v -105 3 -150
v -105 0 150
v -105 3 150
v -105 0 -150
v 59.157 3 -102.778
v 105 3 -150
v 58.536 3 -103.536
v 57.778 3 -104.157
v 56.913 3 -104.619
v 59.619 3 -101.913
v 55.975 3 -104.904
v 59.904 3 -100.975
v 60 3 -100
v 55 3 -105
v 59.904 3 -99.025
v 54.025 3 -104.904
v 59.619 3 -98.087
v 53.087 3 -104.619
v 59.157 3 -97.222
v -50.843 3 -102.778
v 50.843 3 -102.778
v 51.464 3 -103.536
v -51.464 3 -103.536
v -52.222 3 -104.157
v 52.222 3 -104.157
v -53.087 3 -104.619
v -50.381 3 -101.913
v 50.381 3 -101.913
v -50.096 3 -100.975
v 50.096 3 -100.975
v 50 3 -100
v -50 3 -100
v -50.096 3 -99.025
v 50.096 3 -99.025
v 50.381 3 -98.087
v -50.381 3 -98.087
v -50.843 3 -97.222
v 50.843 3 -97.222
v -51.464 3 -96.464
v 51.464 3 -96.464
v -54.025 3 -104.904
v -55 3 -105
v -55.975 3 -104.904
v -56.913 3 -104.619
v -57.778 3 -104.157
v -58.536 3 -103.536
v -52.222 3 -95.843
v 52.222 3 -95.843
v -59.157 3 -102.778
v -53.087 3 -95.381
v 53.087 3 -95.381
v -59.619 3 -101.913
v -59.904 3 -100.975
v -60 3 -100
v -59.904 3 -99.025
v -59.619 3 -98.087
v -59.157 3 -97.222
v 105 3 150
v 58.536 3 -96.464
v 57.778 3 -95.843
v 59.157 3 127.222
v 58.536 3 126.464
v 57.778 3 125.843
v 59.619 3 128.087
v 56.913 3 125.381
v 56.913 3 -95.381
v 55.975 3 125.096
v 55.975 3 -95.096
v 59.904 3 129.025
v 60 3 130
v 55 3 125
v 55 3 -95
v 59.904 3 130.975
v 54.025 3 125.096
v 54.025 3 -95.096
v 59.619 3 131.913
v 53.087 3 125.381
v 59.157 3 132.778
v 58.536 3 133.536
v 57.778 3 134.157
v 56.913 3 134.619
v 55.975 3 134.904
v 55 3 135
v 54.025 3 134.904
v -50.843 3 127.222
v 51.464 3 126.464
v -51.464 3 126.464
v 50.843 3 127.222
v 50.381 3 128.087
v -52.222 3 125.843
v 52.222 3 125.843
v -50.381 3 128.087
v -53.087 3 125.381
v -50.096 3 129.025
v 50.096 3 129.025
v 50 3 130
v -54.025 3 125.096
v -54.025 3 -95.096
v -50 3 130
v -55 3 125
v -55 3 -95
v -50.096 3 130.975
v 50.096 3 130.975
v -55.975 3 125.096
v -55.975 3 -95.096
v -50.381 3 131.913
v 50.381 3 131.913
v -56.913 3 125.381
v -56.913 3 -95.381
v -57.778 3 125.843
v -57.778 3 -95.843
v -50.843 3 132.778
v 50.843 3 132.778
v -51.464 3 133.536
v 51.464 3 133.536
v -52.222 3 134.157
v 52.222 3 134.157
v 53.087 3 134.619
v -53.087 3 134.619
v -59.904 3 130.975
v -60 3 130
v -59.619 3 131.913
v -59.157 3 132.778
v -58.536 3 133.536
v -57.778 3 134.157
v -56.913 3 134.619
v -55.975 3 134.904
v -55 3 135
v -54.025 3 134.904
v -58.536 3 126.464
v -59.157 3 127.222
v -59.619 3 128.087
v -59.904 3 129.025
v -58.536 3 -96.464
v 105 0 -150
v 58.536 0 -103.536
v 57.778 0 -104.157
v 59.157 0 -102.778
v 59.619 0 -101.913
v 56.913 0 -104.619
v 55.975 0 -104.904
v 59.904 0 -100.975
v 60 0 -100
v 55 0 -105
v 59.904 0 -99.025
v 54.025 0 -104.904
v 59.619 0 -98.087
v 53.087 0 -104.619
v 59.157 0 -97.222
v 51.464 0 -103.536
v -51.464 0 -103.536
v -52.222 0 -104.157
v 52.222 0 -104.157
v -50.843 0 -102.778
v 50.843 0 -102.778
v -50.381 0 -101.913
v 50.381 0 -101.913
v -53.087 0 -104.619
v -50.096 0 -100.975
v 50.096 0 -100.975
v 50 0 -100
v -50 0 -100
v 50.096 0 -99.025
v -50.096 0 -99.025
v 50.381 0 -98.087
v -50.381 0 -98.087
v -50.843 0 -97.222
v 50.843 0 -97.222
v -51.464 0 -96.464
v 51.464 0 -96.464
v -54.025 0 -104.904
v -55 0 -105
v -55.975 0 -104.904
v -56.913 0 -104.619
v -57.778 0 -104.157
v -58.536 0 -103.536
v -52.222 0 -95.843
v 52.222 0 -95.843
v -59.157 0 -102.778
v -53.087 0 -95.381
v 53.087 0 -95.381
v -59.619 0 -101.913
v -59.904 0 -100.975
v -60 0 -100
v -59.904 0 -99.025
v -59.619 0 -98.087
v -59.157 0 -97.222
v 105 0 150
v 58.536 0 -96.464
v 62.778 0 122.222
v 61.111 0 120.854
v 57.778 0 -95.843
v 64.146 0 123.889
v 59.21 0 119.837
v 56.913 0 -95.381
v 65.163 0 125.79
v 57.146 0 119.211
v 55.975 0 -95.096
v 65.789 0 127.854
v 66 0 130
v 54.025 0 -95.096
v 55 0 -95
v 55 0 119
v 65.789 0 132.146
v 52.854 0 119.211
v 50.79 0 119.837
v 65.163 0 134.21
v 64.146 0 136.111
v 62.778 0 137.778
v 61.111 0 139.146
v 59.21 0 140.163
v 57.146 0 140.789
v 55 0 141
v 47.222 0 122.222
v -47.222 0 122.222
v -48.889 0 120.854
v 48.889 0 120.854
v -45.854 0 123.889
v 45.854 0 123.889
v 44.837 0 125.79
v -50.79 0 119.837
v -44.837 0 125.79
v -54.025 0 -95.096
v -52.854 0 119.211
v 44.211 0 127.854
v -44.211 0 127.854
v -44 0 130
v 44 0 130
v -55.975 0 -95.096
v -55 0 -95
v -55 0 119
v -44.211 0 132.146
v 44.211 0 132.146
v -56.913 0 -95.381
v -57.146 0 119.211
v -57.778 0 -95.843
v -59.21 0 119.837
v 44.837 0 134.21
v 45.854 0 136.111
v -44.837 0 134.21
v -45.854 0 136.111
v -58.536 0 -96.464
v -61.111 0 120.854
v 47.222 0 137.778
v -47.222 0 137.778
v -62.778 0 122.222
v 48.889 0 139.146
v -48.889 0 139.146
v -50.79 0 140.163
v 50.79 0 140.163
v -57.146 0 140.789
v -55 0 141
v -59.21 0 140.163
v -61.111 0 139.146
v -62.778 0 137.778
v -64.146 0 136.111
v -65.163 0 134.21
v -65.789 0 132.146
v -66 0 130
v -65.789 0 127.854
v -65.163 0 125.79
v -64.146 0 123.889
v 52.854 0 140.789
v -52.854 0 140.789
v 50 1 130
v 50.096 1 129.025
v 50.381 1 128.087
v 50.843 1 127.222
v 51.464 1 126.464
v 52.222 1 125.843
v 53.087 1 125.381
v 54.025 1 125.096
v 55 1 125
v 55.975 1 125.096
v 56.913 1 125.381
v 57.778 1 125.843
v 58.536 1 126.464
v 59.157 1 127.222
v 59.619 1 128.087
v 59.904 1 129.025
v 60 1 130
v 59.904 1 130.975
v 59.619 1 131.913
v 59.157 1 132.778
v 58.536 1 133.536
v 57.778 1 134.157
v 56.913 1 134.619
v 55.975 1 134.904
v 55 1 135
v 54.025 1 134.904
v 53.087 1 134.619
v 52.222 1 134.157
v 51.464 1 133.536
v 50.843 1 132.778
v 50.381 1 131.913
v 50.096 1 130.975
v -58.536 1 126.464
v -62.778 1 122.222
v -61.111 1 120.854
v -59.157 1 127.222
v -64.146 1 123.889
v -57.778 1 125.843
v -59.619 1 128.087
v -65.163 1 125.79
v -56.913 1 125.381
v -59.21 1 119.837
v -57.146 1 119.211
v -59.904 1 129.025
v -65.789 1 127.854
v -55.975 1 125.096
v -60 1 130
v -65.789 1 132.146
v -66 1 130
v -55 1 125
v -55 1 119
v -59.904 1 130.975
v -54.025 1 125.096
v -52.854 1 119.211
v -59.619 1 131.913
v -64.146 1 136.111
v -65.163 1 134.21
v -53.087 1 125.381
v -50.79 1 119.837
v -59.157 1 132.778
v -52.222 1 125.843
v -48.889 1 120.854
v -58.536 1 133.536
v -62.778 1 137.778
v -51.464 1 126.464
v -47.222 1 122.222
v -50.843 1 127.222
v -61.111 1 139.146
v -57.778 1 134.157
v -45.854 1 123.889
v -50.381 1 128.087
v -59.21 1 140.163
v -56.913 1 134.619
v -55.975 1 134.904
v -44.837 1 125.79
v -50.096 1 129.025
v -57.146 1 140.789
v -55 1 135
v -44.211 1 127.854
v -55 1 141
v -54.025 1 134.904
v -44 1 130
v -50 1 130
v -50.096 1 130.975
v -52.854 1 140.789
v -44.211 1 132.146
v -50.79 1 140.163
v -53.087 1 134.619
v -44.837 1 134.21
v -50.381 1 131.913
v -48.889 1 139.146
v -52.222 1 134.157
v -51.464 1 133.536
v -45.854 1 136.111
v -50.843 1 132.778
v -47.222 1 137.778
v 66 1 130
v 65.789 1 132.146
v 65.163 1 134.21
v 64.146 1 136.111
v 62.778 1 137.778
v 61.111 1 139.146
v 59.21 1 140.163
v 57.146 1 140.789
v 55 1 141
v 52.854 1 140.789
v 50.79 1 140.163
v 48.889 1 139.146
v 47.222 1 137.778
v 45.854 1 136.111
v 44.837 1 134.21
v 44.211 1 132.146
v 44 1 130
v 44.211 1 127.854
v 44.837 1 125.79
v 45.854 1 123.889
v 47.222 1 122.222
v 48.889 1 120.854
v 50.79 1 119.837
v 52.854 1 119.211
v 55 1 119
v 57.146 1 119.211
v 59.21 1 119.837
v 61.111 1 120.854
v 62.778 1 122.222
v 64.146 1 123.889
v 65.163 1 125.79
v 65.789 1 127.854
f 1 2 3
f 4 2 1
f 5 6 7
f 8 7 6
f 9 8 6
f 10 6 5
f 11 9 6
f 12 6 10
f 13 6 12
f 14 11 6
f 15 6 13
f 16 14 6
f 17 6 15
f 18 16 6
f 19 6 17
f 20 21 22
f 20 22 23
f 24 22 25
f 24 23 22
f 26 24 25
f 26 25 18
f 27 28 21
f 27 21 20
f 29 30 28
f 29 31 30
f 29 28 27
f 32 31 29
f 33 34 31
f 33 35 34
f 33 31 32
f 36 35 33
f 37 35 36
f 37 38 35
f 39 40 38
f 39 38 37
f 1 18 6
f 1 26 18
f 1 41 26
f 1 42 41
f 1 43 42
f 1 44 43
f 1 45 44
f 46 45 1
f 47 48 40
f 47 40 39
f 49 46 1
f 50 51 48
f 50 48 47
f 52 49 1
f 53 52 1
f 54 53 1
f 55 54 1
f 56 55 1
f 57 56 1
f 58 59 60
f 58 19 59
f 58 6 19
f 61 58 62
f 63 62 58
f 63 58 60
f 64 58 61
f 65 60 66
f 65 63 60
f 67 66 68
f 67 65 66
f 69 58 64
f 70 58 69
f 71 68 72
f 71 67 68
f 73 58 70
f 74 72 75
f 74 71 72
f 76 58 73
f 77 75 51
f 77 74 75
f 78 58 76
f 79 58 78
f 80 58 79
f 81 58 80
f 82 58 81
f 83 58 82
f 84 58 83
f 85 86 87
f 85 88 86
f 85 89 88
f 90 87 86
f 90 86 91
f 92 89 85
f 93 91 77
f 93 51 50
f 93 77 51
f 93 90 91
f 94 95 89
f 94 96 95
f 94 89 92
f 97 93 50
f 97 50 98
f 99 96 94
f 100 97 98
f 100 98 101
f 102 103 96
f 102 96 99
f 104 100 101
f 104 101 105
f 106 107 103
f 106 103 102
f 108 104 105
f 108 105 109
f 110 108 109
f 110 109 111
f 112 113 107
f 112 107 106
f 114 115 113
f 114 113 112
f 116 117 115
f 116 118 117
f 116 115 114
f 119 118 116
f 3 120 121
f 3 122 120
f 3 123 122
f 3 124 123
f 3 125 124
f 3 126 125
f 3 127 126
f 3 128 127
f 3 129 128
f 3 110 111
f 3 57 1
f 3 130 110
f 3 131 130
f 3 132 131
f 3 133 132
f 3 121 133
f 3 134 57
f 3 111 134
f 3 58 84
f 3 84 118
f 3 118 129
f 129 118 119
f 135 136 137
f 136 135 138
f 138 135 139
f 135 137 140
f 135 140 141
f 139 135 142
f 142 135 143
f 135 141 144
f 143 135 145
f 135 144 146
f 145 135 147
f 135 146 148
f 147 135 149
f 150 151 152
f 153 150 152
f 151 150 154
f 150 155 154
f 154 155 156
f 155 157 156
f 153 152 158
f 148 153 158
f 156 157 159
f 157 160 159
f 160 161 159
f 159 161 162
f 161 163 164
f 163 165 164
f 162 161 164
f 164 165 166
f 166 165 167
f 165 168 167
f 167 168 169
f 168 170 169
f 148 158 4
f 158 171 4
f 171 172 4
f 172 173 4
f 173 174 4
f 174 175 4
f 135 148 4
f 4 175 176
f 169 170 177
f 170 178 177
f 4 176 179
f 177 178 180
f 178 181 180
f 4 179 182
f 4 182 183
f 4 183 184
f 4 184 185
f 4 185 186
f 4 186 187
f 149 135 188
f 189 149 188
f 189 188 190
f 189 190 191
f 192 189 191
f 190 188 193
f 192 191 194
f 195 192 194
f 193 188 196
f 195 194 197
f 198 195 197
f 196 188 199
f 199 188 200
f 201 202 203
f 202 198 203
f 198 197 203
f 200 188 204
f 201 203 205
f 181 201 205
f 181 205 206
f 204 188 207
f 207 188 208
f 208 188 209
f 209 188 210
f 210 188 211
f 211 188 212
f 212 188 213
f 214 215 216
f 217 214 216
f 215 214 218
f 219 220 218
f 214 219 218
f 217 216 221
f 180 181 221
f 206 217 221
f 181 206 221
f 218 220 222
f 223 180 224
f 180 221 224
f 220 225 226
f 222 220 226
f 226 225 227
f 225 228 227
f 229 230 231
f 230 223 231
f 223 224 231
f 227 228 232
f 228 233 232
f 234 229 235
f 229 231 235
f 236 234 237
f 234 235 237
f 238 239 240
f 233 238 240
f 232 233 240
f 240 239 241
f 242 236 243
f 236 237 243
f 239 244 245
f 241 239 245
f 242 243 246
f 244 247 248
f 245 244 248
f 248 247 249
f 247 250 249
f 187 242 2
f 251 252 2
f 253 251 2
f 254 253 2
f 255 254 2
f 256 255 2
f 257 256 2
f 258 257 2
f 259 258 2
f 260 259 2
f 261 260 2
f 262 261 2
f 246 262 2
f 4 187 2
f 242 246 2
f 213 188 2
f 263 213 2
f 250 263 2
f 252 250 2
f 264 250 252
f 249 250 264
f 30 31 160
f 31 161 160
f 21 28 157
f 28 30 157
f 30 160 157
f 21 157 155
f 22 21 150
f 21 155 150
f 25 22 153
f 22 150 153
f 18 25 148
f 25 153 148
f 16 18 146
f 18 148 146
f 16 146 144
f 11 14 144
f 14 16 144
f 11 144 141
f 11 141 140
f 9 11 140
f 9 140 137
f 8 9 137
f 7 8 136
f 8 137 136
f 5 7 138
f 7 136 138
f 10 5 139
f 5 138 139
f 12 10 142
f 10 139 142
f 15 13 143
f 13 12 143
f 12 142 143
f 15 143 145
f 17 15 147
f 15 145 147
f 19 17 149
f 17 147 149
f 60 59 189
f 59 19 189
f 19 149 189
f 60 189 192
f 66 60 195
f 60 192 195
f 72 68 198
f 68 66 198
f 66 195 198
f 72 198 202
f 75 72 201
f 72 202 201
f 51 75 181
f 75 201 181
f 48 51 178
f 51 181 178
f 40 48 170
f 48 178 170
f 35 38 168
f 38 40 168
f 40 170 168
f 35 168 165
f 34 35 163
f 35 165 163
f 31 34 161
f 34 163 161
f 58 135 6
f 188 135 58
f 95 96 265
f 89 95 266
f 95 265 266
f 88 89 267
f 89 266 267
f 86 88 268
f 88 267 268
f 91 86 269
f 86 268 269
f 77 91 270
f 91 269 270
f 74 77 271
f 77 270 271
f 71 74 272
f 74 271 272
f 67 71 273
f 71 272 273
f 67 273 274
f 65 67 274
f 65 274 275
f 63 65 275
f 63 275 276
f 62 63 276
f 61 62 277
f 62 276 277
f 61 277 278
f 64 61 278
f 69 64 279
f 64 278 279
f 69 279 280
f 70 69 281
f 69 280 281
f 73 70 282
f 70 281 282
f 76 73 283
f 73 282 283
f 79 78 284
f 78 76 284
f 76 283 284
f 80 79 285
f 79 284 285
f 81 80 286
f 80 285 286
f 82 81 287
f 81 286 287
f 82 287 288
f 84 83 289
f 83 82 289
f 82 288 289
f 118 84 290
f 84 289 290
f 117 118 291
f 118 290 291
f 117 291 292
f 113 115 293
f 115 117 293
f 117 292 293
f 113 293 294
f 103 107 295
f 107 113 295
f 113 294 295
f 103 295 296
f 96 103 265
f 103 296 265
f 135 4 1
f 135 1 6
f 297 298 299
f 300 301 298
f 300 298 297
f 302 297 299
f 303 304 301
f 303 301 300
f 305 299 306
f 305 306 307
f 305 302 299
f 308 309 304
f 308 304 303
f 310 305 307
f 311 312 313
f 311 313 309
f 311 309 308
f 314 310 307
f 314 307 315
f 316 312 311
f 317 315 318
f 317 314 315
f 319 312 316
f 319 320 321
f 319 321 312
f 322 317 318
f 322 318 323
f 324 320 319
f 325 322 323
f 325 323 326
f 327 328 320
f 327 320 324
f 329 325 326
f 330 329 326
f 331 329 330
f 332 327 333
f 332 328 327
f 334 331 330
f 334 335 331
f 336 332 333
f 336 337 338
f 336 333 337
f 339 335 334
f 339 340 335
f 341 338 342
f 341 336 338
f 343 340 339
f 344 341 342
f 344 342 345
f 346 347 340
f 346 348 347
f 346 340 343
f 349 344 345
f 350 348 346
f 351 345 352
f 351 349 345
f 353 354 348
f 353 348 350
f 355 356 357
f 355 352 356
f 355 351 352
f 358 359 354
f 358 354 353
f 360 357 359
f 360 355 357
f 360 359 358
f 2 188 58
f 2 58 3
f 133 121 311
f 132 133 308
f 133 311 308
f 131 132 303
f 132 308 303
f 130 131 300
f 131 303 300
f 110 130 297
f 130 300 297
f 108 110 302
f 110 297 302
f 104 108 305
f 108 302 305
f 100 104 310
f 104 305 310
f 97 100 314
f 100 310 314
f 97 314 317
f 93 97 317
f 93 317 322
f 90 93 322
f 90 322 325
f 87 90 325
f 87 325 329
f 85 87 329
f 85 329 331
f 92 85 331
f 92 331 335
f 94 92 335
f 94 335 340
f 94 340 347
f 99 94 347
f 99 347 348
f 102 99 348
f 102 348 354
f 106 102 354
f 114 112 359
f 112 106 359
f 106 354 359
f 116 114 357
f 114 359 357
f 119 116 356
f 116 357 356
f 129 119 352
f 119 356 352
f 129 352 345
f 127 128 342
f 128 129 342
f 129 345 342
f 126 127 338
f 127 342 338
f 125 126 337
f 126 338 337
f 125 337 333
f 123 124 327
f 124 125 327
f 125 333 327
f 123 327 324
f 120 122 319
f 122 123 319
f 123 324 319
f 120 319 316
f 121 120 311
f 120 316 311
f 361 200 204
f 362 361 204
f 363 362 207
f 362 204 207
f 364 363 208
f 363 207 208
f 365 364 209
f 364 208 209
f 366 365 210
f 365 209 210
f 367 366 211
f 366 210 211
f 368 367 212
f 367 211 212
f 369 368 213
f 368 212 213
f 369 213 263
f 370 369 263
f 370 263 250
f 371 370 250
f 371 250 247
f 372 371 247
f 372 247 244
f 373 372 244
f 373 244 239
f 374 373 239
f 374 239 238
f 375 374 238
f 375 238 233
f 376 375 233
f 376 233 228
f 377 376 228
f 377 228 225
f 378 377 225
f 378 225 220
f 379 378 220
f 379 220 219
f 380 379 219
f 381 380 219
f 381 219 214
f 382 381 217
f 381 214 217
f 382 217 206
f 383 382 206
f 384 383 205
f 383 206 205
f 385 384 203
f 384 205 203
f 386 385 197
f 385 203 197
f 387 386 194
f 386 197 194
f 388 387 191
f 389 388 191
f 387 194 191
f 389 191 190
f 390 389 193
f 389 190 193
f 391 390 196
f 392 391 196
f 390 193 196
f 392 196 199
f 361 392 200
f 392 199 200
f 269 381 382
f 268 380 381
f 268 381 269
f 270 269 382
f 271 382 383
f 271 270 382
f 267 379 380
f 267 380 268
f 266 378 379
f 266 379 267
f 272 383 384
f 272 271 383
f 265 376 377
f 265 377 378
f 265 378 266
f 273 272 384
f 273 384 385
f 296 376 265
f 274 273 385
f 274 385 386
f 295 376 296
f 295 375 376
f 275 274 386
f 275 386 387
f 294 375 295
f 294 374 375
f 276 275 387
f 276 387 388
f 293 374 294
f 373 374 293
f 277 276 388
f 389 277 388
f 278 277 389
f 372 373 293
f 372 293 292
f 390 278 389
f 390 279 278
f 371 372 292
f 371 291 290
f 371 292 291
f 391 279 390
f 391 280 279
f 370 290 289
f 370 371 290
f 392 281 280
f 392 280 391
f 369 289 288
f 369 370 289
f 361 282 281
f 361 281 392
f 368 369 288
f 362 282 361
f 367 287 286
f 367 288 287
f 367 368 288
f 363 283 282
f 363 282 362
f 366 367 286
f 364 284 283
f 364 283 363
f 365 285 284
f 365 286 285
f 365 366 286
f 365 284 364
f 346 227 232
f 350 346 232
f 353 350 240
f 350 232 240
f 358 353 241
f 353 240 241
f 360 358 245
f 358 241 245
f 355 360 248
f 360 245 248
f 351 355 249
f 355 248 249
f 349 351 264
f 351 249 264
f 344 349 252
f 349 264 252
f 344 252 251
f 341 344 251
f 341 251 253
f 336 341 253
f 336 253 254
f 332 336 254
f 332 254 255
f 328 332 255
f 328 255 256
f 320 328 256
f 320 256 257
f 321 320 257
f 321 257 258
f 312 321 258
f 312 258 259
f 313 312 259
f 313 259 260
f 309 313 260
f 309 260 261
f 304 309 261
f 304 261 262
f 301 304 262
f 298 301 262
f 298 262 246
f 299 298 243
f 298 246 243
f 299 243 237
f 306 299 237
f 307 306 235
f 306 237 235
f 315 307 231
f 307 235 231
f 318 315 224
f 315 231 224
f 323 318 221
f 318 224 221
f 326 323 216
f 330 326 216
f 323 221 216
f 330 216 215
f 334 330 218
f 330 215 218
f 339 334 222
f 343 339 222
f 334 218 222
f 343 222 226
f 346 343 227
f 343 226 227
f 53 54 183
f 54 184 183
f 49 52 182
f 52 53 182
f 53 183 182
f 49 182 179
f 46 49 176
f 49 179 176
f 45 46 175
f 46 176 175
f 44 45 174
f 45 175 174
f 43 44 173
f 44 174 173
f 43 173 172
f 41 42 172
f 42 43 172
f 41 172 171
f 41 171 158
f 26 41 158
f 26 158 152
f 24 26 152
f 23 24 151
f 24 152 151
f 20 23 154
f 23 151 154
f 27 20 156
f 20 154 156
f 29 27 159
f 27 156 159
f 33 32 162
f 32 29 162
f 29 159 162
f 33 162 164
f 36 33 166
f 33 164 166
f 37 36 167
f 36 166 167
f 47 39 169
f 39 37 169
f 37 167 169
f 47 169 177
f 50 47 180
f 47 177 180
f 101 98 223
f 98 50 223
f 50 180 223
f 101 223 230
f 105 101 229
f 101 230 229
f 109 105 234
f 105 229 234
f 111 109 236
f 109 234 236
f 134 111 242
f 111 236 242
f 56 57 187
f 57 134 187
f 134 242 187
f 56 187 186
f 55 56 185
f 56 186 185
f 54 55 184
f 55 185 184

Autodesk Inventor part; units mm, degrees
ref_plane "YZ Plane" through (0, 0, 0) normal (1, 0, 0) x (0, 1, 0)
ref_plane "XZ Plane" through (0, 0, 0) normal (0, 1, 0) x (-1, 0, 0)
ref_plane "XY Plane" through (0, 0, 0) normal (0, 0, 1) x (1, 0, 0)
sketch "Sketch1" plane through (0, 0, 0) normal (0, 1, 0) x (-1, 0, 0)
  line L0 (-105, 150) -> (105, 150)
  line L1 (105, 150) -> (105, -150)
  line L2 (105, -150) -> (-105, -150)
  line L3 (-105, -150) -> (-105, 150)
  line L4 (-105, 150) -> (105, -150) construction
  line L5 (105, 150) -> (-105, -150) construction
  circle A0 centre (-55, 130) radius 5
  circle A1 centre (55, 130) radius 5
  circle A2 centre (55, -100) radius 5
  circle A3 centre (-55, -100) radius 5
  point P0 (0, 0)
  dimension "d0" = 210
  dimension "d1" = 300
  dimension "d2" = 50
  dimension "d3" = 10
  dimension "d4" = 20
  dimension "d5" = 50
  dimension "d6" = 20
  dimension "d7" = 50
  dimension "d8" = 50
  dimension "d9" = 50
  dimension "d10" = 50
extrude "Extrusion1" add sketch "Sketch1" along normal blind 3
sketch "Sketch2" plane through (0, 0, 0) normal (0, -1, 0) x (1, 0, 0)
  circle A0 centre (-55, 130) radius 5 projected
  circle A1 centre (-55, 130) radius 11
  circle A2 centre (55, 130) radius 5 projected
  circle A3 centre (55, 130) radius 11
  point P0 (0, 0)
  dimension "d13" = 22
extrude "Extrusion2" cut sketch "Sketch2" against normal blind 1
ref_plane "Work Plane1" through (0, 0, 150) normal (1, 0, 0) x (0, 0, -1)
equation "\"d5\" = d2"
equation "\"d8\" = d2"
equation "\"d10\" = d2"
properties part number "chasis"
